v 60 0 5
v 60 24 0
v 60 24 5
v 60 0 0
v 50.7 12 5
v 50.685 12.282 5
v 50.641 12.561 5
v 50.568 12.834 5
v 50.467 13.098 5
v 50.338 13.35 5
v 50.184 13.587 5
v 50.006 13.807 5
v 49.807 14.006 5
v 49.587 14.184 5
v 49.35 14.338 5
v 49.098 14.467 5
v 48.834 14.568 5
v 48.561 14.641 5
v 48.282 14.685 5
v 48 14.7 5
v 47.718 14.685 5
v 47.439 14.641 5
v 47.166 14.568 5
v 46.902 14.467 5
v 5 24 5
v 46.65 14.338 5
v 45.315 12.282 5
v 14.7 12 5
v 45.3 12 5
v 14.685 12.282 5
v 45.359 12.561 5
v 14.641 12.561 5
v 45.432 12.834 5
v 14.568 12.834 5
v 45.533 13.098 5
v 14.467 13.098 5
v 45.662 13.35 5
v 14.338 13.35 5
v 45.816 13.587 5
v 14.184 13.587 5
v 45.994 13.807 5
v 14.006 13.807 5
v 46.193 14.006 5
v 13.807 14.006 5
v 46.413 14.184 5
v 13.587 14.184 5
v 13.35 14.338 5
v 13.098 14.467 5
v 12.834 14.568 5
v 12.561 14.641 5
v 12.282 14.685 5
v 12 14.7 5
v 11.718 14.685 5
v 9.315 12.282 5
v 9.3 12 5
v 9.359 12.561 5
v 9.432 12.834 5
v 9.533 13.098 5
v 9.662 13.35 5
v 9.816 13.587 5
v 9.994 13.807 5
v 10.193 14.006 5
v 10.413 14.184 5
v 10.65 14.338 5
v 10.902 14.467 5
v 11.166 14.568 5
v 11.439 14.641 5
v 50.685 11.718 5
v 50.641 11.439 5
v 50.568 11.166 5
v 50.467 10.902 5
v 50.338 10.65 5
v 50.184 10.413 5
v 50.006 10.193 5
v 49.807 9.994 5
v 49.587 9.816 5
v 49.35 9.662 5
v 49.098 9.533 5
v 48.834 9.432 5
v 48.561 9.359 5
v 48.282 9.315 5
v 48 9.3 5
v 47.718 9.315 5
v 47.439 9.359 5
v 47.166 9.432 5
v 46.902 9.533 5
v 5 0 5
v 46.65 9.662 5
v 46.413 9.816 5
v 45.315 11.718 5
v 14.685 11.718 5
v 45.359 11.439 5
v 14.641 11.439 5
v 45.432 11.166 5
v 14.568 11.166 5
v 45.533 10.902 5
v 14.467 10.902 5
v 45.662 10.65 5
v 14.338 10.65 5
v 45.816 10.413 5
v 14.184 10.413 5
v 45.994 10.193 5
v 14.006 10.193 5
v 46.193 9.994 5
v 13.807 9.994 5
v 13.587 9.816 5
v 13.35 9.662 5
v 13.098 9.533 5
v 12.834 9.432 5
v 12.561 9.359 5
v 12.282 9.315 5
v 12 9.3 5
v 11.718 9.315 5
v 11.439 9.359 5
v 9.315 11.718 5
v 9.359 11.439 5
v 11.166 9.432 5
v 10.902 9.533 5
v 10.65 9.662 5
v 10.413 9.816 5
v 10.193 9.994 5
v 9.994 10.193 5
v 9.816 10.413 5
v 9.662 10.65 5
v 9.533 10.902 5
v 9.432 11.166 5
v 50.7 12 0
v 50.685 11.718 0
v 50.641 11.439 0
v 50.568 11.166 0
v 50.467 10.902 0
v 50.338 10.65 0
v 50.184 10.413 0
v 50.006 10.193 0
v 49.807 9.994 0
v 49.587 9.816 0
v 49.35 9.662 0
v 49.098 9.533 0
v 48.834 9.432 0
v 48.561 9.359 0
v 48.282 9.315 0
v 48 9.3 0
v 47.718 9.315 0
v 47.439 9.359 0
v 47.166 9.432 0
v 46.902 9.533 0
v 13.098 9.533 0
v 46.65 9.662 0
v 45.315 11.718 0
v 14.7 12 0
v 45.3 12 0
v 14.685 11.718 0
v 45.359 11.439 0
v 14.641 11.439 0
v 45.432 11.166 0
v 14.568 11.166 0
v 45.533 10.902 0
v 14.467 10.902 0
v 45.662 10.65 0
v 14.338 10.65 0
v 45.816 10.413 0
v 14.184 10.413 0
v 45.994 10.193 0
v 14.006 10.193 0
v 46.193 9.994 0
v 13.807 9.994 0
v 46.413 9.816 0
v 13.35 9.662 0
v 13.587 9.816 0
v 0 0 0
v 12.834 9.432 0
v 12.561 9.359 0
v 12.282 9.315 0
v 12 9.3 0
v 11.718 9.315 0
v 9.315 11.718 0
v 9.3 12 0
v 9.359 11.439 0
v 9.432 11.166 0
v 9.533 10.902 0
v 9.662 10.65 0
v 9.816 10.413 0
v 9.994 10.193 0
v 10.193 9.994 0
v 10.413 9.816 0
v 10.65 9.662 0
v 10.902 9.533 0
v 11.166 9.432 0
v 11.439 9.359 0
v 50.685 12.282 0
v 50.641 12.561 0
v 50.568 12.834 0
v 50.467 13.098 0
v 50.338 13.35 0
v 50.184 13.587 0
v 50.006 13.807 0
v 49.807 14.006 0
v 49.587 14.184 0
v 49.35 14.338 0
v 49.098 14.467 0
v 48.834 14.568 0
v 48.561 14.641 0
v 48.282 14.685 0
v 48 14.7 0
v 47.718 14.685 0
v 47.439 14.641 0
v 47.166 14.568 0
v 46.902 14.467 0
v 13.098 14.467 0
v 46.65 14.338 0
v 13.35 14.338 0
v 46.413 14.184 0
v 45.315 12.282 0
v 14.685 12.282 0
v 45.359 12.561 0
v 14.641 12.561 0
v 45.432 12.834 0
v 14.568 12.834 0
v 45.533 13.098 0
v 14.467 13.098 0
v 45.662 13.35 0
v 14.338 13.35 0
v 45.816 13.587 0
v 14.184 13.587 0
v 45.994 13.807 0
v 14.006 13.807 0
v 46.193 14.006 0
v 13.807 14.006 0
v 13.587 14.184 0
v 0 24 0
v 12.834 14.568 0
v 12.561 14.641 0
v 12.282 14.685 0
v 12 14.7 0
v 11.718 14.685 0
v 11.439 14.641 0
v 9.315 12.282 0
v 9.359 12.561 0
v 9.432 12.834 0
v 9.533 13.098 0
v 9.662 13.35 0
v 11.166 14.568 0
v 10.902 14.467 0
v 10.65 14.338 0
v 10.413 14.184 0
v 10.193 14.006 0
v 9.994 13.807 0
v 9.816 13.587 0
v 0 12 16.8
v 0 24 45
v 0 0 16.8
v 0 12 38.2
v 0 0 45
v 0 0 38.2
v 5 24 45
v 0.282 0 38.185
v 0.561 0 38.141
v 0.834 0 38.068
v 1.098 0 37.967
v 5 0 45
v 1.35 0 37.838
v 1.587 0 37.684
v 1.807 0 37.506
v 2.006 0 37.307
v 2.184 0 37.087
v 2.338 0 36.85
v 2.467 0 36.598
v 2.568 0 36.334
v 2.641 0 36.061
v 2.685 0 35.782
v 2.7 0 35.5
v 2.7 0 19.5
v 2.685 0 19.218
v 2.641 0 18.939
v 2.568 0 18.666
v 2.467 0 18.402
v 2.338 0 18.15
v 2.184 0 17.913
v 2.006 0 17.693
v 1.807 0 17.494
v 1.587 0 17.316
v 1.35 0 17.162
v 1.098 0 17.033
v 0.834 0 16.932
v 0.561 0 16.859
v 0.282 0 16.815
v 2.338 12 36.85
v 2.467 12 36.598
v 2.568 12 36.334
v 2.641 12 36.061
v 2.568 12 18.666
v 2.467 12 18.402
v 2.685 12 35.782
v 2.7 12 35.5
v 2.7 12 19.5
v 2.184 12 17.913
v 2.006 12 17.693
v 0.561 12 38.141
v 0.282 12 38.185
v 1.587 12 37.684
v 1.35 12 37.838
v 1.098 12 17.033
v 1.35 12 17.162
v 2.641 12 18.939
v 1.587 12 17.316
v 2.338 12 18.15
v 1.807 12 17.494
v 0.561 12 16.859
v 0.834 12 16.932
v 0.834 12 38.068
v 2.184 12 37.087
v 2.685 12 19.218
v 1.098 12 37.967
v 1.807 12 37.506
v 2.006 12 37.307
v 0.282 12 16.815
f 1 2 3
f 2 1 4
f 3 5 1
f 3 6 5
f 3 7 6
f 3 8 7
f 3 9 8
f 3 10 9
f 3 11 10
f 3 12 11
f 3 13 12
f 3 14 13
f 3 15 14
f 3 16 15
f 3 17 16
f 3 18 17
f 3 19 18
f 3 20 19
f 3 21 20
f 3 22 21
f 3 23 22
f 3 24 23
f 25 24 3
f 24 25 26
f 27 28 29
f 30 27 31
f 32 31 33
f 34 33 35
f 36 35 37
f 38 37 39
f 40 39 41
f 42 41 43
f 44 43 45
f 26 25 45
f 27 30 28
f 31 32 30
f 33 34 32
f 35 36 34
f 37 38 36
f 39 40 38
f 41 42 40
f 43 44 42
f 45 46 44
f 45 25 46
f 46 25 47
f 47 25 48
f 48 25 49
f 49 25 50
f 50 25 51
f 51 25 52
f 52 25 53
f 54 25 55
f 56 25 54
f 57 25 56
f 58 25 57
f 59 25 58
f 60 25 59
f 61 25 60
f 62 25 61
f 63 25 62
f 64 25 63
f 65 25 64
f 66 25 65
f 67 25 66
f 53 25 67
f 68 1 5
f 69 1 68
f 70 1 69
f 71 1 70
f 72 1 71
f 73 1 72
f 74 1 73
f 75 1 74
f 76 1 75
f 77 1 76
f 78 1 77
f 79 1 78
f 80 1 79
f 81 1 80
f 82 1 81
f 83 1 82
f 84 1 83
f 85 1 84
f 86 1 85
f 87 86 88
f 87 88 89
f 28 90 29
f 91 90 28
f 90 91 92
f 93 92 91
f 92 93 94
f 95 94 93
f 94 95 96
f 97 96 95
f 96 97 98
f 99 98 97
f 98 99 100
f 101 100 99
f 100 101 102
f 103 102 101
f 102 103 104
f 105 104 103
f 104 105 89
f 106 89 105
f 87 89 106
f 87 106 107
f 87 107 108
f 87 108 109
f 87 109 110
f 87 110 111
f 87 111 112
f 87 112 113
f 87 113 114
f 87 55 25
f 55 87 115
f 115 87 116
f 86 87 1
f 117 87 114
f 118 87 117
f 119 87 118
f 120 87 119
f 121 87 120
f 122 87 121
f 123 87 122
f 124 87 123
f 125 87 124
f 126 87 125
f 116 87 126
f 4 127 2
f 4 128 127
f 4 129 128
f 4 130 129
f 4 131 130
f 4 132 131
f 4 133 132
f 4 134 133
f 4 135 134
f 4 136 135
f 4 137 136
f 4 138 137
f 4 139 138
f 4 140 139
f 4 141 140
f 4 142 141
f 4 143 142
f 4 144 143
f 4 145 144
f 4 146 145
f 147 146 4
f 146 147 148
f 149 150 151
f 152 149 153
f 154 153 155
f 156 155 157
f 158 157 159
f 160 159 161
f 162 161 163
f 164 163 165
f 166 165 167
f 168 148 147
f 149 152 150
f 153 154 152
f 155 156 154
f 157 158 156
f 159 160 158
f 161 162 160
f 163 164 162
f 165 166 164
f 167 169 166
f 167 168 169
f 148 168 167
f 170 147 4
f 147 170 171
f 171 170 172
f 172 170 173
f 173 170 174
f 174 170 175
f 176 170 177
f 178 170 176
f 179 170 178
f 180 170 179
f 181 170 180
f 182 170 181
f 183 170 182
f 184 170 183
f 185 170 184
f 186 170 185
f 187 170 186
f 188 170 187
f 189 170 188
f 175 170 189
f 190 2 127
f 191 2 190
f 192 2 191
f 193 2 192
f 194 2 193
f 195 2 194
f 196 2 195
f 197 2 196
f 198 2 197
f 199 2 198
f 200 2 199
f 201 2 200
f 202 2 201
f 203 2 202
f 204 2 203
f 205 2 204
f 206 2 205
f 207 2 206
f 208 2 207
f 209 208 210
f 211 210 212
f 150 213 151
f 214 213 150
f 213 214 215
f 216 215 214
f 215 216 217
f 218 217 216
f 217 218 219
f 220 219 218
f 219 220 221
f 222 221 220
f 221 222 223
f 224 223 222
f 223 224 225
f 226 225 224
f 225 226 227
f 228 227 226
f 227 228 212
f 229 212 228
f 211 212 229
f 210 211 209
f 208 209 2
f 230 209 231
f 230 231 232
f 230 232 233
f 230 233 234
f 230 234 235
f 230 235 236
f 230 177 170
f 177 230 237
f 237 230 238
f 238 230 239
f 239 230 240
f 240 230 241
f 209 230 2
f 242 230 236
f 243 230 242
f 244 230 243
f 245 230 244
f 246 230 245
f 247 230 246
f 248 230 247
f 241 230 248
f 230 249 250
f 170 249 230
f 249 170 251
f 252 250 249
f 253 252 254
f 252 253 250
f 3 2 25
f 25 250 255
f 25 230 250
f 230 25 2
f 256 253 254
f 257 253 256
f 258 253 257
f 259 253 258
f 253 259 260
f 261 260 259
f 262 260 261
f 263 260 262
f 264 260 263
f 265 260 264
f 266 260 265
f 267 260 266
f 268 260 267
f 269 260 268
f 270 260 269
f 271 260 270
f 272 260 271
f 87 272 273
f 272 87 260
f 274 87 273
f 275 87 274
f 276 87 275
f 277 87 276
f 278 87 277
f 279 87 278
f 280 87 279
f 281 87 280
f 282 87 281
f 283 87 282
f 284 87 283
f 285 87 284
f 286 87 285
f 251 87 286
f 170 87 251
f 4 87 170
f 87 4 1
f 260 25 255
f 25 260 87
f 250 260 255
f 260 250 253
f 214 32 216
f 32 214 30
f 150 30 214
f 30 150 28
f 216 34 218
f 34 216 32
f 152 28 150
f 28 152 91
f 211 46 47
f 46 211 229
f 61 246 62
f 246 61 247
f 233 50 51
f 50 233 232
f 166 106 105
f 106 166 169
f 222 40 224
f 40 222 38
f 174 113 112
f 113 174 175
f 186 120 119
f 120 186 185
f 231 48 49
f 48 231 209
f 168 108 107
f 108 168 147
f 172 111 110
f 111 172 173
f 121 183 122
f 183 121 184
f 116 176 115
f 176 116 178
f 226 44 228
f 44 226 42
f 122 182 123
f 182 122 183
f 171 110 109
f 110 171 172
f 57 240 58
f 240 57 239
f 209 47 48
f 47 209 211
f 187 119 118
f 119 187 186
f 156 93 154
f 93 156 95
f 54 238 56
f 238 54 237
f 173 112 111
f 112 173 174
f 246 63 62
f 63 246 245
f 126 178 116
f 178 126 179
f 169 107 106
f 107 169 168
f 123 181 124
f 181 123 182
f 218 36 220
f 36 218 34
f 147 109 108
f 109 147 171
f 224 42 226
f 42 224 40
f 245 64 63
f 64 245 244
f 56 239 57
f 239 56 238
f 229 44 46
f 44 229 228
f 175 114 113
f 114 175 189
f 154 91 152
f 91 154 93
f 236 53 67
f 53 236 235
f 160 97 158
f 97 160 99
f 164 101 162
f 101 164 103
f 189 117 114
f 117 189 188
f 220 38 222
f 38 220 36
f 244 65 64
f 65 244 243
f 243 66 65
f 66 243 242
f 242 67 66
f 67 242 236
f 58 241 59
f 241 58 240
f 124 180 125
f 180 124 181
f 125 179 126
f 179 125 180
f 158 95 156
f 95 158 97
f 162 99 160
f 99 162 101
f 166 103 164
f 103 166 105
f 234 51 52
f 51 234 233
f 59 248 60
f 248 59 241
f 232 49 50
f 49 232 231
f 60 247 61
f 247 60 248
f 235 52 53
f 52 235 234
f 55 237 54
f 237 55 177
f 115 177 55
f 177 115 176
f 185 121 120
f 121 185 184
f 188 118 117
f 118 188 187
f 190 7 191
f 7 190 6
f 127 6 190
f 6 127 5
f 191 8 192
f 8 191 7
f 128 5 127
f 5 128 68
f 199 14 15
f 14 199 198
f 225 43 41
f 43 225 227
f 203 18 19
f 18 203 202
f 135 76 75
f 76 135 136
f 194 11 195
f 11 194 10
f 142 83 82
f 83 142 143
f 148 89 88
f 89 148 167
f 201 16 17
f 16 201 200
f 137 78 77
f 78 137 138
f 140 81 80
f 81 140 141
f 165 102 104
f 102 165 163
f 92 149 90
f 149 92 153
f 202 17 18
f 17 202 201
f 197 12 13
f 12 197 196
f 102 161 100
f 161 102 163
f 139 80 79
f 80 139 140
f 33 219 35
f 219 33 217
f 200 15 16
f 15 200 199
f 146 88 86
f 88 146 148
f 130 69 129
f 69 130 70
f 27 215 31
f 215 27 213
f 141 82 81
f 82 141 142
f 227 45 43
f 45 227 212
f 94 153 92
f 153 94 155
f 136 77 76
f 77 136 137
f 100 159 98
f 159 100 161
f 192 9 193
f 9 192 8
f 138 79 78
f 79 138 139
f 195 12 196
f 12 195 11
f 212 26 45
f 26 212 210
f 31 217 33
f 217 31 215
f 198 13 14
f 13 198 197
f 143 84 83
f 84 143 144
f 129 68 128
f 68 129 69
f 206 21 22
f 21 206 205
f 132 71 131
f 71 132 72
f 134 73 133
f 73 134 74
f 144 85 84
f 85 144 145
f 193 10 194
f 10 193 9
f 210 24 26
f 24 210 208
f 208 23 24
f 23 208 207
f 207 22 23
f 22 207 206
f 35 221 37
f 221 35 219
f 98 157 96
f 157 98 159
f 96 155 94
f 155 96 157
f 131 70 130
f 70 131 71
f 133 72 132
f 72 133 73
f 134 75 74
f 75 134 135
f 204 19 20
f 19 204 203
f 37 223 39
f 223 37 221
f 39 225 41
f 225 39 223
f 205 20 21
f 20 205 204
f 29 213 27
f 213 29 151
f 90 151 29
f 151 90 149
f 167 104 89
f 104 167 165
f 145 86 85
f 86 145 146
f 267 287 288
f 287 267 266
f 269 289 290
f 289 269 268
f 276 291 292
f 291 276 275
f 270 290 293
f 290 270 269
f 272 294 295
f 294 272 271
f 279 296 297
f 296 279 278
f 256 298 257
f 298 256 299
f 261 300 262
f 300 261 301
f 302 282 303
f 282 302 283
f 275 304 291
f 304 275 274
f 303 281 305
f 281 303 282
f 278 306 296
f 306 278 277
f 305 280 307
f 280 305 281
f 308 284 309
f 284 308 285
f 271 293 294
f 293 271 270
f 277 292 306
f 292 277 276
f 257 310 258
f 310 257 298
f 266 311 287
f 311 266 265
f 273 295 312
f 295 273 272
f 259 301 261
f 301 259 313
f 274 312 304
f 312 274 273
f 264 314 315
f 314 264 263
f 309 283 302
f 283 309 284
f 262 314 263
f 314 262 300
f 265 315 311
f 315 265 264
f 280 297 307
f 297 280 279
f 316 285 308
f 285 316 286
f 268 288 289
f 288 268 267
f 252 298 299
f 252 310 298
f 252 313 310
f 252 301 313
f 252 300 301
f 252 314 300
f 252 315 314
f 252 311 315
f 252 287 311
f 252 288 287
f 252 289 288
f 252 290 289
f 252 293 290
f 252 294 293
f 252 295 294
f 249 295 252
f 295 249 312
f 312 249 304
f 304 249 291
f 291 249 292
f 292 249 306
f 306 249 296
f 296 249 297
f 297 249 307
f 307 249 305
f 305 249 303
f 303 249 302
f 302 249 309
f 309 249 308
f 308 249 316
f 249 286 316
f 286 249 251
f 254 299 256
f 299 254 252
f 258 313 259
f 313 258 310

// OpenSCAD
// Adjustable L bracket with upright slot.
$fn = 60;
eps = 0.02;
base_l = 60;
upright_h = 45;
width = 24;
thickness = 5;
slot_l = 16;
module vertical_slot() { hull() { translate([0,width/2,thickness+upright_h/2-slot_l/2]) rotate([90,0,0]) cylinder(d=5.4,h=width+2*eps); translate([0,width/2,thickness+upright_h/2+slot_l/2]) rotate([90,0,0]) cylinder(d=5.4,h=width+2*eps); } }
difference() {
    union() { cube([base_l,width,thickness]); cube([thickness,width,upright_h]); }
    for(x=[12,base_l-12]) translate([x,width/2,-eps]) cylinder(d=5.4,h=thickness+2*eps);
    vertical_slot();
}
